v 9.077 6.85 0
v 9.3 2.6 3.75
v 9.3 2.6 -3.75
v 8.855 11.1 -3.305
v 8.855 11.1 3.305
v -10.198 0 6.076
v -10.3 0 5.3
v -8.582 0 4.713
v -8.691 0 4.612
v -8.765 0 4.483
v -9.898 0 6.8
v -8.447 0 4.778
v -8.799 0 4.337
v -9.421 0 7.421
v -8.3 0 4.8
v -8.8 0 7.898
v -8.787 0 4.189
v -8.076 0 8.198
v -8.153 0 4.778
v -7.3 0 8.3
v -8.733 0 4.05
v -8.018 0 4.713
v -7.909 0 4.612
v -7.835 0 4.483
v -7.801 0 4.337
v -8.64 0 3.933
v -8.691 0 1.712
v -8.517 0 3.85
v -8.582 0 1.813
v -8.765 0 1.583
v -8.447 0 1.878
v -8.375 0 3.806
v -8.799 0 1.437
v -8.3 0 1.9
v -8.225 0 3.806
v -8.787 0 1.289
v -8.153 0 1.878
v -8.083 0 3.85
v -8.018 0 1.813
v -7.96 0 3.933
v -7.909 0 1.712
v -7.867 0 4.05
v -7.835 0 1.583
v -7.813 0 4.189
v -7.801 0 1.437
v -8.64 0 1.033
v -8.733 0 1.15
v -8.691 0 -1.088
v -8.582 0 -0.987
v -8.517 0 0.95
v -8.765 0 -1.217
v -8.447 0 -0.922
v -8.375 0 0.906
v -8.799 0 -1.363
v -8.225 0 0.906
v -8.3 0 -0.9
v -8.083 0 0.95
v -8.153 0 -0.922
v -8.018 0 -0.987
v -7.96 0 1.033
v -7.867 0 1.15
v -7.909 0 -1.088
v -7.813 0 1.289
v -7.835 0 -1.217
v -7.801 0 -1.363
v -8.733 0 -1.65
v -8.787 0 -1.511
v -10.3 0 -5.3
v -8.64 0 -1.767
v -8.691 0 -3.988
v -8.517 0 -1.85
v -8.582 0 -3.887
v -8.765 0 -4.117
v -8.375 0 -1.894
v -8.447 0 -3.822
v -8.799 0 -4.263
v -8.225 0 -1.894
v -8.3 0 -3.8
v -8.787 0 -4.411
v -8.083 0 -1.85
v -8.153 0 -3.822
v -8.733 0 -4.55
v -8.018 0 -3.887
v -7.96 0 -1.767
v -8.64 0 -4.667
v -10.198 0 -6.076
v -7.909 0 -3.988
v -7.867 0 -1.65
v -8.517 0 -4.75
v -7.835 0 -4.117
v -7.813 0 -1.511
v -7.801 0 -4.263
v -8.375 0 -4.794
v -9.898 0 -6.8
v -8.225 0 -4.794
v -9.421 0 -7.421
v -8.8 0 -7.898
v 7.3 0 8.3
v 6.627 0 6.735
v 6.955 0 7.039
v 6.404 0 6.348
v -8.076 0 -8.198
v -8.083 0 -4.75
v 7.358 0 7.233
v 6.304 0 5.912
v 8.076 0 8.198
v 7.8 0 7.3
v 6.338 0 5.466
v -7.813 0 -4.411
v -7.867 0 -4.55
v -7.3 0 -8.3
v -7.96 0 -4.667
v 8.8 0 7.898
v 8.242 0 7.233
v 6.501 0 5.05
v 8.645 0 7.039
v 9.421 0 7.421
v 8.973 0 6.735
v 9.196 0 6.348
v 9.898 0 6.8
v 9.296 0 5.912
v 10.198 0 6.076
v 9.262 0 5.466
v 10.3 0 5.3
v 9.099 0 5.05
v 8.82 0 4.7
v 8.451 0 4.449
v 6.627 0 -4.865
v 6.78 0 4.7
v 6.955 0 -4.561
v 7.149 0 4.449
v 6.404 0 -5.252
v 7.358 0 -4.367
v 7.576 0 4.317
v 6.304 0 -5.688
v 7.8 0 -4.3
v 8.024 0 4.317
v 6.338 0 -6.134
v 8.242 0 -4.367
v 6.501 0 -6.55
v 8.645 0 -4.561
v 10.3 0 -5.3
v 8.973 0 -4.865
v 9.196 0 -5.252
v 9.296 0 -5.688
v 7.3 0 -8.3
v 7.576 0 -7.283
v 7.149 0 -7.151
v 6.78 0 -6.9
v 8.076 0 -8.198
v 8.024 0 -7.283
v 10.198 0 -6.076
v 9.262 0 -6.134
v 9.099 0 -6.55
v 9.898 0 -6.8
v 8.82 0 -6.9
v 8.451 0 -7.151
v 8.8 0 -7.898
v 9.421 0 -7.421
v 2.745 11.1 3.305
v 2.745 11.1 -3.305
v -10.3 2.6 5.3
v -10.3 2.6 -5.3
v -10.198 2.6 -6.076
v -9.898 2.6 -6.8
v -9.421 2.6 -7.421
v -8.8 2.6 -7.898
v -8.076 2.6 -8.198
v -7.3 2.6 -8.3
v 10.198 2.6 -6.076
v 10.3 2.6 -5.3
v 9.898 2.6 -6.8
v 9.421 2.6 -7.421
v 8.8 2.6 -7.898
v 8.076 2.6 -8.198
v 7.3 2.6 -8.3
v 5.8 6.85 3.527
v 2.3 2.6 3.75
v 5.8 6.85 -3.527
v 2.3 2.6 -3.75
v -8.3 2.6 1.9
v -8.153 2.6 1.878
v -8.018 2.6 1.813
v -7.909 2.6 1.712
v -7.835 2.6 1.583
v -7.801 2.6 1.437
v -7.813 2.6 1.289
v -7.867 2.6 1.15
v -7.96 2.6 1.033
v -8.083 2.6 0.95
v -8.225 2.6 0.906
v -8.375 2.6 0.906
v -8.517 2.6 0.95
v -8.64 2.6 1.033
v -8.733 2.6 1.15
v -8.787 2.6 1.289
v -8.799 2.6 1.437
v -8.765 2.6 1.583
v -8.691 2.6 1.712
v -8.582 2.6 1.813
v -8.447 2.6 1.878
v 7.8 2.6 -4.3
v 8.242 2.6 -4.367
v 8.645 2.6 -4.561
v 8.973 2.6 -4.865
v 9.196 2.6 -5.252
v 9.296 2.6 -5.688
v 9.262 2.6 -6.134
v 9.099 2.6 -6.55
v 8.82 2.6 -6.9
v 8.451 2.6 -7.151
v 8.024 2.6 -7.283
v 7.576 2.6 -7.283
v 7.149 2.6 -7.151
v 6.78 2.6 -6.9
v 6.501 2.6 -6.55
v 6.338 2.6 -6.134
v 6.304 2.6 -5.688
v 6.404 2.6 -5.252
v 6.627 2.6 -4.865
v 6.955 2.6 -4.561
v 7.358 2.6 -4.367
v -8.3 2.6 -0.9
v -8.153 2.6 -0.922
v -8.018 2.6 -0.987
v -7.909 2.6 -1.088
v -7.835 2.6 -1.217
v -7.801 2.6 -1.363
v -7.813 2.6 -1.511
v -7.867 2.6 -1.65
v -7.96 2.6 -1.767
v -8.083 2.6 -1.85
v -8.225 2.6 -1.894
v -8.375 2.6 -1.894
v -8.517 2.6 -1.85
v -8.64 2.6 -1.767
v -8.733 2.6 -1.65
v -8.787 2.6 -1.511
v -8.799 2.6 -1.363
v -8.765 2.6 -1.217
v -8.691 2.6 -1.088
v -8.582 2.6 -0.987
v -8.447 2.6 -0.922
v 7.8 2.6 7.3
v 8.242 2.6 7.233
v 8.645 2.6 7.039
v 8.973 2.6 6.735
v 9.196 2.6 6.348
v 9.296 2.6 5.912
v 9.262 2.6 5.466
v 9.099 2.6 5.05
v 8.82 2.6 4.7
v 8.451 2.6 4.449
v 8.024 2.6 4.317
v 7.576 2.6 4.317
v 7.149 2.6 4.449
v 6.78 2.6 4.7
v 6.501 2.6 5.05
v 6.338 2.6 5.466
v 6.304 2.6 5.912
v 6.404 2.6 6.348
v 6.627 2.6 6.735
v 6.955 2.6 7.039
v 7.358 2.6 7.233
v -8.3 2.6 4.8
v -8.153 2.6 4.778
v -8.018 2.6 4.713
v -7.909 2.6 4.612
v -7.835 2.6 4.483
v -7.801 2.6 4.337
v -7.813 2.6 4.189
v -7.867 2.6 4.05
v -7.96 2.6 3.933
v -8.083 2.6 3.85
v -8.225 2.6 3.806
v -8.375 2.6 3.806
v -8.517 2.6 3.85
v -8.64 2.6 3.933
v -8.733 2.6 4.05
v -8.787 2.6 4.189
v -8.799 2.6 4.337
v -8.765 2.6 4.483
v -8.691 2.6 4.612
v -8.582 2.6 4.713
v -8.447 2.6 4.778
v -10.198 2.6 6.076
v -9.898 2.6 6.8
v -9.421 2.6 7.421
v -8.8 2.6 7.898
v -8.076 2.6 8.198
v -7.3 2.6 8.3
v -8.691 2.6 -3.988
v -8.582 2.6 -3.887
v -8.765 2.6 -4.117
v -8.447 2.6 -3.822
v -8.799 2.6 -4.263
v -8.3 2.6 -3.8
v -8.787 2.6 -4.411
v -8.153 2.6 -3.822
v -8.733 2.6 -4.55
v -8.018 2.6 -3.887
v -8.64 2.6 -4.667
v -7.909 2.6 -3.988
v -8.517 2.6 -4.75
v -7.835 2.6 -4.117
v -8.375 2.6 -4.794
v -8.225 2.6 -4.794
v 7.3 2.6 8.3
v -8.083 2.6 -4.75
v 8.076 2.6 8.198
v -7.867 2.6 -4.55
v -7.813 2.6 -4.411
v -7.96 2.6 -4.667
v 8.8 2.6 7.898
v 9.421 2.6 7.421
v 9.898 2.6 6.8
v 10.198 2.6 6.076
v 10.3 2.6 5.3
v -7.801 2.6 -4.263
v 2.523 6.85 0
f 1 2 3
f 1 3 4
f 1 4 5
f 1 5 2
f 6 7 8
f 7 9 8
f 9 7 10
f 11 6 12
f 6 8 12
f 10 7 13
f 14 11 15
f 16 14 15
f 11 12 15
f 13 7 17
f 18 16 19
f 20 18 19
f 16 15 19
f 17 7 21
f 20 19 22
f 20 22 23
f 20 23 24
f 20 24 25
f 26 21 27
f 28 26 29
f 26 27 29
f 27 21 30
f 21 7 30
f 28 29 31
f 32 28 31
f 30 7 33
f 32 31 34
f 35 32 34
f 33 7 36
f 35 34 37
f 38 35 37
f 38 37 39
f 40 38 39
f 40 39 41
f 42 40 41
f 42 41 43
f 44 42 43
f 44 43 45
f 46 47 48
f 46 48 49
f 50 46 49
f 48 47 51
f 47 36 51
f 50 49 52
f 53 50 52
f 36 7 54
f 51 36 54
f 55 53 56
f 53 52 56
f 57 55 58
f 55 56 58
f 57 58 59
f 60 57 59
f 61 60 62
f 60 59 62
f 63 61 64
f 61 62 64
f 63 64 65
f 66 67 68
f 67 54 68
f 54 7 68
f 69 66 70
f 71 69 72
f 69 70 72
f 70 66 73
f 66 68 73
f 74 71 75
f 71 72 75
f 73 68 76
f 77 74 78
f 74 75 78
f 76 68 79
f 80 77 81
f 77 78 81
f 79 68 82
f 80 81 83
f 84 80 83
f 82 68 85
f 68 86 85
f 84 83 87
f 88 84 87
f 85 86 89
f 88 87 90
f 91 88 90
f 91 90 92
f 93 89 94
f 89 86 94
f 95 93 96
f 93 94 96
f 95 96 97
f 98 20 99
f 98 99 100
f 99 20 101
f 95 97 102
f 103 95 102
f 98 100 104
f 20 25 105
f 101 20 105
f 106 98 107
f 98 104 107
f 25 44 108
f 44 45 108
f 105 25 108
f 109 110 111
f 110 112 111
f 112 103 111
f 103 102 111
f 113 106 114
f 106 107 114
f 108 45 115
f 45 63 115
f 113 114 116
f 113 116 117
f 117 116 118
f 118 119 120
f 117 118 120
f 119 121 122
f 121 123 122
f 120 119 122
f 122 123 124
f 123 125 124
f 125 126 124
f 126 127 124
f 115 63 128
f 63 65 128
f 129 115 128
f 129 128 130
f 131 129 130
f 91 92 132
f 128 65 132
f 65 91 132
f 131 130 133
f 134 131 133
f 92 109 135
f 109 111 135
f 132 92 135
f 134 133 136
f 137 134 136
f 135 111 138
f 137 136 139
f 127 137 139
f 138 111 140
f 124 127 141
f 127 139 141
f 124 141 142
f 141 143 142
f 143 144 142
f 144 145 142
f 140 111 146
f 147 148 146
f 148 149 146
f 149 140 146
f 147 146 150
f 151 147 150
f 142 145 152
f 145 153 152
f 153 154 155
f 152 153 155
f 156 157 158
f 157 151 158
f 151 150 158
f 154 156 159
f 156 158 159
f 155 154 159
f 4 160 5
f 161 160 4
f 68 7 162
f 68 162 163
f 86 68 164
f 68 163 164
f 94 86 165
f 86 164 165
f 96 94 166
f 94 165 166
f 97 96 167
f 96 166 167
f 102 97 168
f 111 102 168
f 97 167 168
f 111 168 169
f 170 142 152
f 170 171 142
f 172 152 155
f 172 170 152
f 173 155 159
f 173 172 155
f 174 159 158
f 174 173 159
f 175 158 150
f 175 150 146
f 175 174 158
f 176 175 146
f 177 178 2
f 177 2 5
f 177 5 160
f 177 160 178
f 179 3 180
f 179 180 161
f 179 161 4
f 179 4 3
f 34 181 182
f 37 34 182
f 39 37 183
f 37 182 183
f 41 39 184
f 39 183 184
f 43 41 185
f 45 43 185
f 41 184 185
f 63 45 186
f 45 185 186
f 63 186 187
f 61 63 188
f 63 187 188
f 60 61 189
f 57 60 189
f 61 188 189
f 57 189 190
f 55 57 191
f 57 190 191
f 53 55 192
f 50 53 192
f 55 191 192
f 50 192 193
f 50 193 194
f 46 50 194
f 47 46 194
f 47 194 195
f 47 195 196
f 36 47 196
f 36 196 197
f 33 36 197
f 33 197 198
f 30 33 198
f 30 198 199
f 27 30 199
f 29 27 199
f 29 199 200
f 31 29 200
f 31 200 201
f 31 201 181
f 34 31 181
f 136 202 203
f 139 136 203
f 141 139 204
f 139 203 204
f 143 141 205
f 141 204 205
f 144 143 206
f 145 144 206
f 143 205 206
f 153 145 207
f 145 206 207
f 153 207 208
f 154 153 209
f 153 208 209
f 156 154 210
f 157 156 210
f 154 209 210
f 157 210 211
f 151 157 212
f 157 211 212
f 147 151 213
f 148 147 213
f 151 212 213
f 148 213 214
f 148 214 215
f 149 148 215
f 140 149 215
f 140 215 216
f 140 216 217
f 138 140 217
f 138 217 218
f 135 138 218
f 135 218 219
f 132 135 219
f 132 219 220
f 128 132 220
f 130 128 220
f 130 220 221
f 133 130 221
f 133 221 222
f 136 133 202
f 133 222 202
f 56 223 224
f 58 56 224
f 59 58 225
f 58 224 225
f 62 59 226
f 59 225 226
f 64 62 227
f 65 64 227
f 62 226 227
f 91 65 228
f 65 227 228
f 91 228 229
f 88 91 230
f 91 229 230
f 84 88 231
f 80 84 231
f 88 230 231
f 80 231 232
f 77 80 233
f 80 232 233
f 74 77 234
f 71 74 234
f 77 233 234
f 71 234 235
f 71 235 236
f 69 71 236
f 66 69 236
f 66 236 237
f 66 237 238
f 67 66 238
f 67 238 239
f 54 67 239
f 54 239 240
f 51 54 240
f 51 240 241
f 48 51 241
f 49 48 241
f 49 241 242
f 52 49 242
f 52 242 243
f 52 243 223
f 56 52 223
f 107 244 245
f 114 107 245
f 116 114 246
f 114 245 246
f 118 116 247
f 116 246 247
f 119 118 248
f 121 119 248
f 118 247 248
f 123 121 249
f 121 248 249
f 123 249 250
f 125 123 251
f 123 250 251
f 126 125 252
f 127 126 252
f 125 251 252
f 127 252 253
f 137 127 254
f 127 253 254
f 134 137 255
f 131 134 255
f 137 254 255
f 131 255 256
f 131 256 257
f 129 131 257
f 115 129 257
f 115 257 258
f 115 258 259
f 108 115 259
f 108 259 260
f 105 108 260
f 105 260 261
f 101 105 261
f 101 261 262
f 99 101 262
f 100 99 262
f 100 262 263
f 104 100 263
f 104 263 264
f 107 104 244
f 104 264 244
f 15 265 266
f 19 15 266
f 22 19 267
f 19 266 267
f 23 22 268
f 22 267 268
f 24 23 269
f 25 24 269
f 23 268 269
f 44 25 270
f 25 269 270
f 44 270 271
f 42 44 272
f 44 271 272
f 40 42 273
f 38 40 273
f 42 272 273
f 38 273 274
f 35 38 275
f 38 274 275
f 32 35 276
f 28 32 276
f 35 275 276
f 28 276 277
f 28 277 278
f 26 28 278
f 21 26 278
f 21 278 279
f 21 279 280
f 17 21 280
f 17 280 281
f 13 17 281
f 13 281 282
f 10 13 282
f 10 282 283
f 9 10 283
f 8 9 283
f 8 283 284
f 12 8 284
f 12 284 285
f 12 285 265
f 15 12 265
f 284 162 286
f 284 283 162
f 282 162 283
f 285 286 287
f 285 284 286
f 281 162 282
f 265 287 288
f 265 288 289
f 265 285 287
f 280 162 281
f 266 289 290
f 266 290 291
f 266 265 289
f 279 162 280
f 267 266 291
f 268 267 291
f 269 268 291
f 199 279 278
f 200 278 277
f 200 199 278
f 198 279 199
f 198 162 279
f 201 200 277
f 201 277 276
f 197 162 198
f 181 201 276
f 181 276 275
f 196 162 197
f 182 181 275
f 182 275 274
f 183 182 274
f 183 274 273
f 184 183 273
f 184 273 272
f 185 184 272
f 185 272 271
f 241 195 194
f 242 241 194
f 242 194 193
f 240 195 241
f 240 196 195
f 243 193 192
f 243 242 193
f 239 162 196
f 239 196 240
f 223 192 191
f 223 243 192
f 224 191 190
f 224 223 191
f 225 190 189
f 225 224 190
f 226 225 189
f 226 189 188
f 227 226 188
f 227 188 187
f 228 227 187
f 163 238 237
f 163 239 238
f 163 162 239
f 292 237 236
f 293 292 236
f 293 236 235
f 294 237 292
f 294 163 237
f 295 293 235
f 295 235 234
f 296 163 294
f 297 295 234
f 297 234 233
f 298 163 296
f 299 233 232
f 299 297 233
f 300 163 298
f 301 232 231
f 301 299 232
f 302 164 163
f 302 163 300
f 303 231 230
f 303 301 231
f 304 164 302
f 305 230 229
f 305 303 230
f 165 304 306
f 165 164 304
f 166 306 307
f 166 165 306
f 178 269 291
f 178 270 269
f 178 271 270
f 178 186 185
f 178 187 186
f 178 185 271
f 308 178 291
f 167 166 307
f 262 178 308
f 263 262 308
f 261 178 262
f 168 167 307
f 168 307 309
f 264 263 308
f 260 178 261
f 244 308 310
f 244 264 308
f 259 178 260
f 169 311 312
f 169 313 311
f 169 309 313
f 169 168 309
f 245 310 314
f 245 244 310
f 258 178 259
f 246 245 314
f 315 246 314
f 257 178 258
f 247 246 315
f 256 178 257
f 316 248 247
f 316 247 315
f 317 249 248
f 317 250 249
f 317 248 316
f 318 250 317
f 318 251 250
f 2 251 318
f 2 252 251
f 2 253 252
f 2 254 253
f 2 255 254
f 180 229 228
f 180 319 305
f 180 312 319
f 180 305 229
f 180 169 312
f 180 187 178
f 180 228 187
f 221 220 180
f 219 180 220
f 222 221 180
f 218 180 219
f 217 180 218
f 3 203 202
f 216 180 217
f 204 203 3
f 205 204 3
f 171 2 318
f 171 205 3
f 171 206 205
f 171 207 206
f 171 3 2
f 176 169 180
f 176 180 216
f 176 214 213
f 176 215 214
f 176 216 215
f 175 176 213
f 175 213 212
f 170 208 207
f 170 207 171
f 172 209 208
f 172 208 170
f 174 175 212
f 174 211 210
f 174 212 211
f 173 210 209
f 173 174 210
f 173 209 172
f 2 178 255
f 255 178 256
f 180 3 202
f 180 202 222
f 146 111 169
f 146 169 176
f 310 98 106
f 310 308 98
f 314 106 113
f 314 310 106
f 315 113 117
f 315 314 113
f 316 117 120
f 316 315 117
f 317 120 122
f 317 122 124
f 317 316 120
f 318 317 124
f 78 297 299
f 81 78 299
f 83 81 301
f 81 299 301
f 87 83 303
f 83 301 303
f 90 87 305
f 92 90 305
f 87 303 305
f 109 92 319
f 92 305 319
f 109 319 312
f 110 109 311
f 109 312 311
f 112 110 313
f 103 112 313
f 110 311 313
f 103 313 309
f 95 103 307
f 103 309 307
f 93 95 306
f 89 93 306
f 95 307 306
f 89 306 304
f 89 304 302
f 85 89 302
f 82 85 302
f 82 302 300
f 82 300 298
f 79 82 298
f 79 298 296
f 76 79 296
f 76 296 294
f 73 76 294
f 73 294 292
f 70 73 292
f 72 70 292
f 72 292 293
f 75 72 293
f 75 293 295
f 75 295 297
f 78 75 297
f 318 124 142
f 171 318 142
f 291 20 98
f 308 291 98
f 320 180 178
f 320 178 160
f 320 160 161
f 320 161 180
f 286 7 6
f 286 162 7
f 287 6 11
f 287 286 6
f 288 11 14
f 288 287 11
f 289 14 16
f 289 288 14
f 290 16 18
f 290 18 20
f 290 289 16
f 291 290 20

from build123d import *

# Parameters (mm, degrees)
SKETCH1_W           = 20.6
SKETCH1_H           = 16.6
BOSS_EXTRUDE1_DEPTH = 2.6
FILLET1_R           = 3
SKETCH2_R           = 1.5
CUT_EXTRUDE1_DEPTH  = 2.6
SKETCH3_W           = 7
SKETCH3_H           = 7.5
BOSS_EXTRUDE2_DEPTH = 8.5
BOSS_EXTRUDE2_TAPER = 3
SKETCH4_R           = 0.5
CUT_EXTRUDE2_DEPTH  = 8.5


with BuildPart() as part:
    # Sketch1 → Boss-Extrude1 (new body)
    with BuildSketch(Plane(origin=(0, 0, 0), x_dir=(1, 0, 0), z_dir=(0, 1, 0))):
        Rectangle(SKETCH1_W, SKETCH1_H)
    extrude(amount=BOSS_EXTRUDE1_DEPTH)

    # Fillet1
    fillet1_edges = [part.edges().sort_by_distance(p)[0] for p in [
        (10.3, 1.3, 8.3),
        (-10.3, 1.3, 8.3),
        (-10.3, 1.3, -8.3),
        (10.3, 1.3, -8.3),
    ]]
    fillet(fillet1_edges, radius=FILLET1_R)

    # Sketch2 → Cut-Extrude1 (cut)
    with BuildSketch(Plane(origin=(0, 2.6, 0), x_dir=(1, 0, 0), z_dir=(0, 1, 0))):
        with Locations(Location((7.8, 5.8, 0), (0, 0, 270))):
            Circle(SKETCH2_R)
        with Locations(Location((7.8, -5.8, 0), (0, 0, 270))):
            Circle(SKETCH2_R)
    extrude(amount=-CUT_EXTRUDE1_DEPTH, mode=Mode.SUBTRACT)

    # Sketch3 → Boss-Extrude2 (add)
    with BuildSketch(Plane(origin=(0, 2.6, 0), x_dir=(1, 0, 0), z_dir=(0, 1, 0))):
        with Locations((5.8, 0)):
            Rectangle(SKETCH3_W, SKETCH3_H)
    extrude(amount=BOSS_EXTRUDE2_DEPTH, taper=BOSS_EXTRUDE2_TAPER)

    # Sketch4 → Cut-Extrude2 (cut)
    with BuildSketch(Plane(origin=(0, 2.6, 0), x_dir=(1, 0, 0), z_dir=(0, 1, 0))):
        with Locations(Location((-8.3, 4.3, 0), (0, 0, 270))):
            Circle(SKETCH4_R)
        with Locations(Location((-8.3, -4.3, 0), (0, 0, 270))):
            Circle(SKETCH4_R)
        with Locations(Location((-8.3, -1.4, 0), (0, 0, 270))):
            Circle(SKETCH4_R)
        with Locations(Location((-8.3, 1.4, 0), (0, 0, 270))):
            Circle(SKETCH4_R)
    extrude(amount=-CUT_EXTRUDE2_DEPTH, mode=Mode.SUBTRACT)


solid = part.part
